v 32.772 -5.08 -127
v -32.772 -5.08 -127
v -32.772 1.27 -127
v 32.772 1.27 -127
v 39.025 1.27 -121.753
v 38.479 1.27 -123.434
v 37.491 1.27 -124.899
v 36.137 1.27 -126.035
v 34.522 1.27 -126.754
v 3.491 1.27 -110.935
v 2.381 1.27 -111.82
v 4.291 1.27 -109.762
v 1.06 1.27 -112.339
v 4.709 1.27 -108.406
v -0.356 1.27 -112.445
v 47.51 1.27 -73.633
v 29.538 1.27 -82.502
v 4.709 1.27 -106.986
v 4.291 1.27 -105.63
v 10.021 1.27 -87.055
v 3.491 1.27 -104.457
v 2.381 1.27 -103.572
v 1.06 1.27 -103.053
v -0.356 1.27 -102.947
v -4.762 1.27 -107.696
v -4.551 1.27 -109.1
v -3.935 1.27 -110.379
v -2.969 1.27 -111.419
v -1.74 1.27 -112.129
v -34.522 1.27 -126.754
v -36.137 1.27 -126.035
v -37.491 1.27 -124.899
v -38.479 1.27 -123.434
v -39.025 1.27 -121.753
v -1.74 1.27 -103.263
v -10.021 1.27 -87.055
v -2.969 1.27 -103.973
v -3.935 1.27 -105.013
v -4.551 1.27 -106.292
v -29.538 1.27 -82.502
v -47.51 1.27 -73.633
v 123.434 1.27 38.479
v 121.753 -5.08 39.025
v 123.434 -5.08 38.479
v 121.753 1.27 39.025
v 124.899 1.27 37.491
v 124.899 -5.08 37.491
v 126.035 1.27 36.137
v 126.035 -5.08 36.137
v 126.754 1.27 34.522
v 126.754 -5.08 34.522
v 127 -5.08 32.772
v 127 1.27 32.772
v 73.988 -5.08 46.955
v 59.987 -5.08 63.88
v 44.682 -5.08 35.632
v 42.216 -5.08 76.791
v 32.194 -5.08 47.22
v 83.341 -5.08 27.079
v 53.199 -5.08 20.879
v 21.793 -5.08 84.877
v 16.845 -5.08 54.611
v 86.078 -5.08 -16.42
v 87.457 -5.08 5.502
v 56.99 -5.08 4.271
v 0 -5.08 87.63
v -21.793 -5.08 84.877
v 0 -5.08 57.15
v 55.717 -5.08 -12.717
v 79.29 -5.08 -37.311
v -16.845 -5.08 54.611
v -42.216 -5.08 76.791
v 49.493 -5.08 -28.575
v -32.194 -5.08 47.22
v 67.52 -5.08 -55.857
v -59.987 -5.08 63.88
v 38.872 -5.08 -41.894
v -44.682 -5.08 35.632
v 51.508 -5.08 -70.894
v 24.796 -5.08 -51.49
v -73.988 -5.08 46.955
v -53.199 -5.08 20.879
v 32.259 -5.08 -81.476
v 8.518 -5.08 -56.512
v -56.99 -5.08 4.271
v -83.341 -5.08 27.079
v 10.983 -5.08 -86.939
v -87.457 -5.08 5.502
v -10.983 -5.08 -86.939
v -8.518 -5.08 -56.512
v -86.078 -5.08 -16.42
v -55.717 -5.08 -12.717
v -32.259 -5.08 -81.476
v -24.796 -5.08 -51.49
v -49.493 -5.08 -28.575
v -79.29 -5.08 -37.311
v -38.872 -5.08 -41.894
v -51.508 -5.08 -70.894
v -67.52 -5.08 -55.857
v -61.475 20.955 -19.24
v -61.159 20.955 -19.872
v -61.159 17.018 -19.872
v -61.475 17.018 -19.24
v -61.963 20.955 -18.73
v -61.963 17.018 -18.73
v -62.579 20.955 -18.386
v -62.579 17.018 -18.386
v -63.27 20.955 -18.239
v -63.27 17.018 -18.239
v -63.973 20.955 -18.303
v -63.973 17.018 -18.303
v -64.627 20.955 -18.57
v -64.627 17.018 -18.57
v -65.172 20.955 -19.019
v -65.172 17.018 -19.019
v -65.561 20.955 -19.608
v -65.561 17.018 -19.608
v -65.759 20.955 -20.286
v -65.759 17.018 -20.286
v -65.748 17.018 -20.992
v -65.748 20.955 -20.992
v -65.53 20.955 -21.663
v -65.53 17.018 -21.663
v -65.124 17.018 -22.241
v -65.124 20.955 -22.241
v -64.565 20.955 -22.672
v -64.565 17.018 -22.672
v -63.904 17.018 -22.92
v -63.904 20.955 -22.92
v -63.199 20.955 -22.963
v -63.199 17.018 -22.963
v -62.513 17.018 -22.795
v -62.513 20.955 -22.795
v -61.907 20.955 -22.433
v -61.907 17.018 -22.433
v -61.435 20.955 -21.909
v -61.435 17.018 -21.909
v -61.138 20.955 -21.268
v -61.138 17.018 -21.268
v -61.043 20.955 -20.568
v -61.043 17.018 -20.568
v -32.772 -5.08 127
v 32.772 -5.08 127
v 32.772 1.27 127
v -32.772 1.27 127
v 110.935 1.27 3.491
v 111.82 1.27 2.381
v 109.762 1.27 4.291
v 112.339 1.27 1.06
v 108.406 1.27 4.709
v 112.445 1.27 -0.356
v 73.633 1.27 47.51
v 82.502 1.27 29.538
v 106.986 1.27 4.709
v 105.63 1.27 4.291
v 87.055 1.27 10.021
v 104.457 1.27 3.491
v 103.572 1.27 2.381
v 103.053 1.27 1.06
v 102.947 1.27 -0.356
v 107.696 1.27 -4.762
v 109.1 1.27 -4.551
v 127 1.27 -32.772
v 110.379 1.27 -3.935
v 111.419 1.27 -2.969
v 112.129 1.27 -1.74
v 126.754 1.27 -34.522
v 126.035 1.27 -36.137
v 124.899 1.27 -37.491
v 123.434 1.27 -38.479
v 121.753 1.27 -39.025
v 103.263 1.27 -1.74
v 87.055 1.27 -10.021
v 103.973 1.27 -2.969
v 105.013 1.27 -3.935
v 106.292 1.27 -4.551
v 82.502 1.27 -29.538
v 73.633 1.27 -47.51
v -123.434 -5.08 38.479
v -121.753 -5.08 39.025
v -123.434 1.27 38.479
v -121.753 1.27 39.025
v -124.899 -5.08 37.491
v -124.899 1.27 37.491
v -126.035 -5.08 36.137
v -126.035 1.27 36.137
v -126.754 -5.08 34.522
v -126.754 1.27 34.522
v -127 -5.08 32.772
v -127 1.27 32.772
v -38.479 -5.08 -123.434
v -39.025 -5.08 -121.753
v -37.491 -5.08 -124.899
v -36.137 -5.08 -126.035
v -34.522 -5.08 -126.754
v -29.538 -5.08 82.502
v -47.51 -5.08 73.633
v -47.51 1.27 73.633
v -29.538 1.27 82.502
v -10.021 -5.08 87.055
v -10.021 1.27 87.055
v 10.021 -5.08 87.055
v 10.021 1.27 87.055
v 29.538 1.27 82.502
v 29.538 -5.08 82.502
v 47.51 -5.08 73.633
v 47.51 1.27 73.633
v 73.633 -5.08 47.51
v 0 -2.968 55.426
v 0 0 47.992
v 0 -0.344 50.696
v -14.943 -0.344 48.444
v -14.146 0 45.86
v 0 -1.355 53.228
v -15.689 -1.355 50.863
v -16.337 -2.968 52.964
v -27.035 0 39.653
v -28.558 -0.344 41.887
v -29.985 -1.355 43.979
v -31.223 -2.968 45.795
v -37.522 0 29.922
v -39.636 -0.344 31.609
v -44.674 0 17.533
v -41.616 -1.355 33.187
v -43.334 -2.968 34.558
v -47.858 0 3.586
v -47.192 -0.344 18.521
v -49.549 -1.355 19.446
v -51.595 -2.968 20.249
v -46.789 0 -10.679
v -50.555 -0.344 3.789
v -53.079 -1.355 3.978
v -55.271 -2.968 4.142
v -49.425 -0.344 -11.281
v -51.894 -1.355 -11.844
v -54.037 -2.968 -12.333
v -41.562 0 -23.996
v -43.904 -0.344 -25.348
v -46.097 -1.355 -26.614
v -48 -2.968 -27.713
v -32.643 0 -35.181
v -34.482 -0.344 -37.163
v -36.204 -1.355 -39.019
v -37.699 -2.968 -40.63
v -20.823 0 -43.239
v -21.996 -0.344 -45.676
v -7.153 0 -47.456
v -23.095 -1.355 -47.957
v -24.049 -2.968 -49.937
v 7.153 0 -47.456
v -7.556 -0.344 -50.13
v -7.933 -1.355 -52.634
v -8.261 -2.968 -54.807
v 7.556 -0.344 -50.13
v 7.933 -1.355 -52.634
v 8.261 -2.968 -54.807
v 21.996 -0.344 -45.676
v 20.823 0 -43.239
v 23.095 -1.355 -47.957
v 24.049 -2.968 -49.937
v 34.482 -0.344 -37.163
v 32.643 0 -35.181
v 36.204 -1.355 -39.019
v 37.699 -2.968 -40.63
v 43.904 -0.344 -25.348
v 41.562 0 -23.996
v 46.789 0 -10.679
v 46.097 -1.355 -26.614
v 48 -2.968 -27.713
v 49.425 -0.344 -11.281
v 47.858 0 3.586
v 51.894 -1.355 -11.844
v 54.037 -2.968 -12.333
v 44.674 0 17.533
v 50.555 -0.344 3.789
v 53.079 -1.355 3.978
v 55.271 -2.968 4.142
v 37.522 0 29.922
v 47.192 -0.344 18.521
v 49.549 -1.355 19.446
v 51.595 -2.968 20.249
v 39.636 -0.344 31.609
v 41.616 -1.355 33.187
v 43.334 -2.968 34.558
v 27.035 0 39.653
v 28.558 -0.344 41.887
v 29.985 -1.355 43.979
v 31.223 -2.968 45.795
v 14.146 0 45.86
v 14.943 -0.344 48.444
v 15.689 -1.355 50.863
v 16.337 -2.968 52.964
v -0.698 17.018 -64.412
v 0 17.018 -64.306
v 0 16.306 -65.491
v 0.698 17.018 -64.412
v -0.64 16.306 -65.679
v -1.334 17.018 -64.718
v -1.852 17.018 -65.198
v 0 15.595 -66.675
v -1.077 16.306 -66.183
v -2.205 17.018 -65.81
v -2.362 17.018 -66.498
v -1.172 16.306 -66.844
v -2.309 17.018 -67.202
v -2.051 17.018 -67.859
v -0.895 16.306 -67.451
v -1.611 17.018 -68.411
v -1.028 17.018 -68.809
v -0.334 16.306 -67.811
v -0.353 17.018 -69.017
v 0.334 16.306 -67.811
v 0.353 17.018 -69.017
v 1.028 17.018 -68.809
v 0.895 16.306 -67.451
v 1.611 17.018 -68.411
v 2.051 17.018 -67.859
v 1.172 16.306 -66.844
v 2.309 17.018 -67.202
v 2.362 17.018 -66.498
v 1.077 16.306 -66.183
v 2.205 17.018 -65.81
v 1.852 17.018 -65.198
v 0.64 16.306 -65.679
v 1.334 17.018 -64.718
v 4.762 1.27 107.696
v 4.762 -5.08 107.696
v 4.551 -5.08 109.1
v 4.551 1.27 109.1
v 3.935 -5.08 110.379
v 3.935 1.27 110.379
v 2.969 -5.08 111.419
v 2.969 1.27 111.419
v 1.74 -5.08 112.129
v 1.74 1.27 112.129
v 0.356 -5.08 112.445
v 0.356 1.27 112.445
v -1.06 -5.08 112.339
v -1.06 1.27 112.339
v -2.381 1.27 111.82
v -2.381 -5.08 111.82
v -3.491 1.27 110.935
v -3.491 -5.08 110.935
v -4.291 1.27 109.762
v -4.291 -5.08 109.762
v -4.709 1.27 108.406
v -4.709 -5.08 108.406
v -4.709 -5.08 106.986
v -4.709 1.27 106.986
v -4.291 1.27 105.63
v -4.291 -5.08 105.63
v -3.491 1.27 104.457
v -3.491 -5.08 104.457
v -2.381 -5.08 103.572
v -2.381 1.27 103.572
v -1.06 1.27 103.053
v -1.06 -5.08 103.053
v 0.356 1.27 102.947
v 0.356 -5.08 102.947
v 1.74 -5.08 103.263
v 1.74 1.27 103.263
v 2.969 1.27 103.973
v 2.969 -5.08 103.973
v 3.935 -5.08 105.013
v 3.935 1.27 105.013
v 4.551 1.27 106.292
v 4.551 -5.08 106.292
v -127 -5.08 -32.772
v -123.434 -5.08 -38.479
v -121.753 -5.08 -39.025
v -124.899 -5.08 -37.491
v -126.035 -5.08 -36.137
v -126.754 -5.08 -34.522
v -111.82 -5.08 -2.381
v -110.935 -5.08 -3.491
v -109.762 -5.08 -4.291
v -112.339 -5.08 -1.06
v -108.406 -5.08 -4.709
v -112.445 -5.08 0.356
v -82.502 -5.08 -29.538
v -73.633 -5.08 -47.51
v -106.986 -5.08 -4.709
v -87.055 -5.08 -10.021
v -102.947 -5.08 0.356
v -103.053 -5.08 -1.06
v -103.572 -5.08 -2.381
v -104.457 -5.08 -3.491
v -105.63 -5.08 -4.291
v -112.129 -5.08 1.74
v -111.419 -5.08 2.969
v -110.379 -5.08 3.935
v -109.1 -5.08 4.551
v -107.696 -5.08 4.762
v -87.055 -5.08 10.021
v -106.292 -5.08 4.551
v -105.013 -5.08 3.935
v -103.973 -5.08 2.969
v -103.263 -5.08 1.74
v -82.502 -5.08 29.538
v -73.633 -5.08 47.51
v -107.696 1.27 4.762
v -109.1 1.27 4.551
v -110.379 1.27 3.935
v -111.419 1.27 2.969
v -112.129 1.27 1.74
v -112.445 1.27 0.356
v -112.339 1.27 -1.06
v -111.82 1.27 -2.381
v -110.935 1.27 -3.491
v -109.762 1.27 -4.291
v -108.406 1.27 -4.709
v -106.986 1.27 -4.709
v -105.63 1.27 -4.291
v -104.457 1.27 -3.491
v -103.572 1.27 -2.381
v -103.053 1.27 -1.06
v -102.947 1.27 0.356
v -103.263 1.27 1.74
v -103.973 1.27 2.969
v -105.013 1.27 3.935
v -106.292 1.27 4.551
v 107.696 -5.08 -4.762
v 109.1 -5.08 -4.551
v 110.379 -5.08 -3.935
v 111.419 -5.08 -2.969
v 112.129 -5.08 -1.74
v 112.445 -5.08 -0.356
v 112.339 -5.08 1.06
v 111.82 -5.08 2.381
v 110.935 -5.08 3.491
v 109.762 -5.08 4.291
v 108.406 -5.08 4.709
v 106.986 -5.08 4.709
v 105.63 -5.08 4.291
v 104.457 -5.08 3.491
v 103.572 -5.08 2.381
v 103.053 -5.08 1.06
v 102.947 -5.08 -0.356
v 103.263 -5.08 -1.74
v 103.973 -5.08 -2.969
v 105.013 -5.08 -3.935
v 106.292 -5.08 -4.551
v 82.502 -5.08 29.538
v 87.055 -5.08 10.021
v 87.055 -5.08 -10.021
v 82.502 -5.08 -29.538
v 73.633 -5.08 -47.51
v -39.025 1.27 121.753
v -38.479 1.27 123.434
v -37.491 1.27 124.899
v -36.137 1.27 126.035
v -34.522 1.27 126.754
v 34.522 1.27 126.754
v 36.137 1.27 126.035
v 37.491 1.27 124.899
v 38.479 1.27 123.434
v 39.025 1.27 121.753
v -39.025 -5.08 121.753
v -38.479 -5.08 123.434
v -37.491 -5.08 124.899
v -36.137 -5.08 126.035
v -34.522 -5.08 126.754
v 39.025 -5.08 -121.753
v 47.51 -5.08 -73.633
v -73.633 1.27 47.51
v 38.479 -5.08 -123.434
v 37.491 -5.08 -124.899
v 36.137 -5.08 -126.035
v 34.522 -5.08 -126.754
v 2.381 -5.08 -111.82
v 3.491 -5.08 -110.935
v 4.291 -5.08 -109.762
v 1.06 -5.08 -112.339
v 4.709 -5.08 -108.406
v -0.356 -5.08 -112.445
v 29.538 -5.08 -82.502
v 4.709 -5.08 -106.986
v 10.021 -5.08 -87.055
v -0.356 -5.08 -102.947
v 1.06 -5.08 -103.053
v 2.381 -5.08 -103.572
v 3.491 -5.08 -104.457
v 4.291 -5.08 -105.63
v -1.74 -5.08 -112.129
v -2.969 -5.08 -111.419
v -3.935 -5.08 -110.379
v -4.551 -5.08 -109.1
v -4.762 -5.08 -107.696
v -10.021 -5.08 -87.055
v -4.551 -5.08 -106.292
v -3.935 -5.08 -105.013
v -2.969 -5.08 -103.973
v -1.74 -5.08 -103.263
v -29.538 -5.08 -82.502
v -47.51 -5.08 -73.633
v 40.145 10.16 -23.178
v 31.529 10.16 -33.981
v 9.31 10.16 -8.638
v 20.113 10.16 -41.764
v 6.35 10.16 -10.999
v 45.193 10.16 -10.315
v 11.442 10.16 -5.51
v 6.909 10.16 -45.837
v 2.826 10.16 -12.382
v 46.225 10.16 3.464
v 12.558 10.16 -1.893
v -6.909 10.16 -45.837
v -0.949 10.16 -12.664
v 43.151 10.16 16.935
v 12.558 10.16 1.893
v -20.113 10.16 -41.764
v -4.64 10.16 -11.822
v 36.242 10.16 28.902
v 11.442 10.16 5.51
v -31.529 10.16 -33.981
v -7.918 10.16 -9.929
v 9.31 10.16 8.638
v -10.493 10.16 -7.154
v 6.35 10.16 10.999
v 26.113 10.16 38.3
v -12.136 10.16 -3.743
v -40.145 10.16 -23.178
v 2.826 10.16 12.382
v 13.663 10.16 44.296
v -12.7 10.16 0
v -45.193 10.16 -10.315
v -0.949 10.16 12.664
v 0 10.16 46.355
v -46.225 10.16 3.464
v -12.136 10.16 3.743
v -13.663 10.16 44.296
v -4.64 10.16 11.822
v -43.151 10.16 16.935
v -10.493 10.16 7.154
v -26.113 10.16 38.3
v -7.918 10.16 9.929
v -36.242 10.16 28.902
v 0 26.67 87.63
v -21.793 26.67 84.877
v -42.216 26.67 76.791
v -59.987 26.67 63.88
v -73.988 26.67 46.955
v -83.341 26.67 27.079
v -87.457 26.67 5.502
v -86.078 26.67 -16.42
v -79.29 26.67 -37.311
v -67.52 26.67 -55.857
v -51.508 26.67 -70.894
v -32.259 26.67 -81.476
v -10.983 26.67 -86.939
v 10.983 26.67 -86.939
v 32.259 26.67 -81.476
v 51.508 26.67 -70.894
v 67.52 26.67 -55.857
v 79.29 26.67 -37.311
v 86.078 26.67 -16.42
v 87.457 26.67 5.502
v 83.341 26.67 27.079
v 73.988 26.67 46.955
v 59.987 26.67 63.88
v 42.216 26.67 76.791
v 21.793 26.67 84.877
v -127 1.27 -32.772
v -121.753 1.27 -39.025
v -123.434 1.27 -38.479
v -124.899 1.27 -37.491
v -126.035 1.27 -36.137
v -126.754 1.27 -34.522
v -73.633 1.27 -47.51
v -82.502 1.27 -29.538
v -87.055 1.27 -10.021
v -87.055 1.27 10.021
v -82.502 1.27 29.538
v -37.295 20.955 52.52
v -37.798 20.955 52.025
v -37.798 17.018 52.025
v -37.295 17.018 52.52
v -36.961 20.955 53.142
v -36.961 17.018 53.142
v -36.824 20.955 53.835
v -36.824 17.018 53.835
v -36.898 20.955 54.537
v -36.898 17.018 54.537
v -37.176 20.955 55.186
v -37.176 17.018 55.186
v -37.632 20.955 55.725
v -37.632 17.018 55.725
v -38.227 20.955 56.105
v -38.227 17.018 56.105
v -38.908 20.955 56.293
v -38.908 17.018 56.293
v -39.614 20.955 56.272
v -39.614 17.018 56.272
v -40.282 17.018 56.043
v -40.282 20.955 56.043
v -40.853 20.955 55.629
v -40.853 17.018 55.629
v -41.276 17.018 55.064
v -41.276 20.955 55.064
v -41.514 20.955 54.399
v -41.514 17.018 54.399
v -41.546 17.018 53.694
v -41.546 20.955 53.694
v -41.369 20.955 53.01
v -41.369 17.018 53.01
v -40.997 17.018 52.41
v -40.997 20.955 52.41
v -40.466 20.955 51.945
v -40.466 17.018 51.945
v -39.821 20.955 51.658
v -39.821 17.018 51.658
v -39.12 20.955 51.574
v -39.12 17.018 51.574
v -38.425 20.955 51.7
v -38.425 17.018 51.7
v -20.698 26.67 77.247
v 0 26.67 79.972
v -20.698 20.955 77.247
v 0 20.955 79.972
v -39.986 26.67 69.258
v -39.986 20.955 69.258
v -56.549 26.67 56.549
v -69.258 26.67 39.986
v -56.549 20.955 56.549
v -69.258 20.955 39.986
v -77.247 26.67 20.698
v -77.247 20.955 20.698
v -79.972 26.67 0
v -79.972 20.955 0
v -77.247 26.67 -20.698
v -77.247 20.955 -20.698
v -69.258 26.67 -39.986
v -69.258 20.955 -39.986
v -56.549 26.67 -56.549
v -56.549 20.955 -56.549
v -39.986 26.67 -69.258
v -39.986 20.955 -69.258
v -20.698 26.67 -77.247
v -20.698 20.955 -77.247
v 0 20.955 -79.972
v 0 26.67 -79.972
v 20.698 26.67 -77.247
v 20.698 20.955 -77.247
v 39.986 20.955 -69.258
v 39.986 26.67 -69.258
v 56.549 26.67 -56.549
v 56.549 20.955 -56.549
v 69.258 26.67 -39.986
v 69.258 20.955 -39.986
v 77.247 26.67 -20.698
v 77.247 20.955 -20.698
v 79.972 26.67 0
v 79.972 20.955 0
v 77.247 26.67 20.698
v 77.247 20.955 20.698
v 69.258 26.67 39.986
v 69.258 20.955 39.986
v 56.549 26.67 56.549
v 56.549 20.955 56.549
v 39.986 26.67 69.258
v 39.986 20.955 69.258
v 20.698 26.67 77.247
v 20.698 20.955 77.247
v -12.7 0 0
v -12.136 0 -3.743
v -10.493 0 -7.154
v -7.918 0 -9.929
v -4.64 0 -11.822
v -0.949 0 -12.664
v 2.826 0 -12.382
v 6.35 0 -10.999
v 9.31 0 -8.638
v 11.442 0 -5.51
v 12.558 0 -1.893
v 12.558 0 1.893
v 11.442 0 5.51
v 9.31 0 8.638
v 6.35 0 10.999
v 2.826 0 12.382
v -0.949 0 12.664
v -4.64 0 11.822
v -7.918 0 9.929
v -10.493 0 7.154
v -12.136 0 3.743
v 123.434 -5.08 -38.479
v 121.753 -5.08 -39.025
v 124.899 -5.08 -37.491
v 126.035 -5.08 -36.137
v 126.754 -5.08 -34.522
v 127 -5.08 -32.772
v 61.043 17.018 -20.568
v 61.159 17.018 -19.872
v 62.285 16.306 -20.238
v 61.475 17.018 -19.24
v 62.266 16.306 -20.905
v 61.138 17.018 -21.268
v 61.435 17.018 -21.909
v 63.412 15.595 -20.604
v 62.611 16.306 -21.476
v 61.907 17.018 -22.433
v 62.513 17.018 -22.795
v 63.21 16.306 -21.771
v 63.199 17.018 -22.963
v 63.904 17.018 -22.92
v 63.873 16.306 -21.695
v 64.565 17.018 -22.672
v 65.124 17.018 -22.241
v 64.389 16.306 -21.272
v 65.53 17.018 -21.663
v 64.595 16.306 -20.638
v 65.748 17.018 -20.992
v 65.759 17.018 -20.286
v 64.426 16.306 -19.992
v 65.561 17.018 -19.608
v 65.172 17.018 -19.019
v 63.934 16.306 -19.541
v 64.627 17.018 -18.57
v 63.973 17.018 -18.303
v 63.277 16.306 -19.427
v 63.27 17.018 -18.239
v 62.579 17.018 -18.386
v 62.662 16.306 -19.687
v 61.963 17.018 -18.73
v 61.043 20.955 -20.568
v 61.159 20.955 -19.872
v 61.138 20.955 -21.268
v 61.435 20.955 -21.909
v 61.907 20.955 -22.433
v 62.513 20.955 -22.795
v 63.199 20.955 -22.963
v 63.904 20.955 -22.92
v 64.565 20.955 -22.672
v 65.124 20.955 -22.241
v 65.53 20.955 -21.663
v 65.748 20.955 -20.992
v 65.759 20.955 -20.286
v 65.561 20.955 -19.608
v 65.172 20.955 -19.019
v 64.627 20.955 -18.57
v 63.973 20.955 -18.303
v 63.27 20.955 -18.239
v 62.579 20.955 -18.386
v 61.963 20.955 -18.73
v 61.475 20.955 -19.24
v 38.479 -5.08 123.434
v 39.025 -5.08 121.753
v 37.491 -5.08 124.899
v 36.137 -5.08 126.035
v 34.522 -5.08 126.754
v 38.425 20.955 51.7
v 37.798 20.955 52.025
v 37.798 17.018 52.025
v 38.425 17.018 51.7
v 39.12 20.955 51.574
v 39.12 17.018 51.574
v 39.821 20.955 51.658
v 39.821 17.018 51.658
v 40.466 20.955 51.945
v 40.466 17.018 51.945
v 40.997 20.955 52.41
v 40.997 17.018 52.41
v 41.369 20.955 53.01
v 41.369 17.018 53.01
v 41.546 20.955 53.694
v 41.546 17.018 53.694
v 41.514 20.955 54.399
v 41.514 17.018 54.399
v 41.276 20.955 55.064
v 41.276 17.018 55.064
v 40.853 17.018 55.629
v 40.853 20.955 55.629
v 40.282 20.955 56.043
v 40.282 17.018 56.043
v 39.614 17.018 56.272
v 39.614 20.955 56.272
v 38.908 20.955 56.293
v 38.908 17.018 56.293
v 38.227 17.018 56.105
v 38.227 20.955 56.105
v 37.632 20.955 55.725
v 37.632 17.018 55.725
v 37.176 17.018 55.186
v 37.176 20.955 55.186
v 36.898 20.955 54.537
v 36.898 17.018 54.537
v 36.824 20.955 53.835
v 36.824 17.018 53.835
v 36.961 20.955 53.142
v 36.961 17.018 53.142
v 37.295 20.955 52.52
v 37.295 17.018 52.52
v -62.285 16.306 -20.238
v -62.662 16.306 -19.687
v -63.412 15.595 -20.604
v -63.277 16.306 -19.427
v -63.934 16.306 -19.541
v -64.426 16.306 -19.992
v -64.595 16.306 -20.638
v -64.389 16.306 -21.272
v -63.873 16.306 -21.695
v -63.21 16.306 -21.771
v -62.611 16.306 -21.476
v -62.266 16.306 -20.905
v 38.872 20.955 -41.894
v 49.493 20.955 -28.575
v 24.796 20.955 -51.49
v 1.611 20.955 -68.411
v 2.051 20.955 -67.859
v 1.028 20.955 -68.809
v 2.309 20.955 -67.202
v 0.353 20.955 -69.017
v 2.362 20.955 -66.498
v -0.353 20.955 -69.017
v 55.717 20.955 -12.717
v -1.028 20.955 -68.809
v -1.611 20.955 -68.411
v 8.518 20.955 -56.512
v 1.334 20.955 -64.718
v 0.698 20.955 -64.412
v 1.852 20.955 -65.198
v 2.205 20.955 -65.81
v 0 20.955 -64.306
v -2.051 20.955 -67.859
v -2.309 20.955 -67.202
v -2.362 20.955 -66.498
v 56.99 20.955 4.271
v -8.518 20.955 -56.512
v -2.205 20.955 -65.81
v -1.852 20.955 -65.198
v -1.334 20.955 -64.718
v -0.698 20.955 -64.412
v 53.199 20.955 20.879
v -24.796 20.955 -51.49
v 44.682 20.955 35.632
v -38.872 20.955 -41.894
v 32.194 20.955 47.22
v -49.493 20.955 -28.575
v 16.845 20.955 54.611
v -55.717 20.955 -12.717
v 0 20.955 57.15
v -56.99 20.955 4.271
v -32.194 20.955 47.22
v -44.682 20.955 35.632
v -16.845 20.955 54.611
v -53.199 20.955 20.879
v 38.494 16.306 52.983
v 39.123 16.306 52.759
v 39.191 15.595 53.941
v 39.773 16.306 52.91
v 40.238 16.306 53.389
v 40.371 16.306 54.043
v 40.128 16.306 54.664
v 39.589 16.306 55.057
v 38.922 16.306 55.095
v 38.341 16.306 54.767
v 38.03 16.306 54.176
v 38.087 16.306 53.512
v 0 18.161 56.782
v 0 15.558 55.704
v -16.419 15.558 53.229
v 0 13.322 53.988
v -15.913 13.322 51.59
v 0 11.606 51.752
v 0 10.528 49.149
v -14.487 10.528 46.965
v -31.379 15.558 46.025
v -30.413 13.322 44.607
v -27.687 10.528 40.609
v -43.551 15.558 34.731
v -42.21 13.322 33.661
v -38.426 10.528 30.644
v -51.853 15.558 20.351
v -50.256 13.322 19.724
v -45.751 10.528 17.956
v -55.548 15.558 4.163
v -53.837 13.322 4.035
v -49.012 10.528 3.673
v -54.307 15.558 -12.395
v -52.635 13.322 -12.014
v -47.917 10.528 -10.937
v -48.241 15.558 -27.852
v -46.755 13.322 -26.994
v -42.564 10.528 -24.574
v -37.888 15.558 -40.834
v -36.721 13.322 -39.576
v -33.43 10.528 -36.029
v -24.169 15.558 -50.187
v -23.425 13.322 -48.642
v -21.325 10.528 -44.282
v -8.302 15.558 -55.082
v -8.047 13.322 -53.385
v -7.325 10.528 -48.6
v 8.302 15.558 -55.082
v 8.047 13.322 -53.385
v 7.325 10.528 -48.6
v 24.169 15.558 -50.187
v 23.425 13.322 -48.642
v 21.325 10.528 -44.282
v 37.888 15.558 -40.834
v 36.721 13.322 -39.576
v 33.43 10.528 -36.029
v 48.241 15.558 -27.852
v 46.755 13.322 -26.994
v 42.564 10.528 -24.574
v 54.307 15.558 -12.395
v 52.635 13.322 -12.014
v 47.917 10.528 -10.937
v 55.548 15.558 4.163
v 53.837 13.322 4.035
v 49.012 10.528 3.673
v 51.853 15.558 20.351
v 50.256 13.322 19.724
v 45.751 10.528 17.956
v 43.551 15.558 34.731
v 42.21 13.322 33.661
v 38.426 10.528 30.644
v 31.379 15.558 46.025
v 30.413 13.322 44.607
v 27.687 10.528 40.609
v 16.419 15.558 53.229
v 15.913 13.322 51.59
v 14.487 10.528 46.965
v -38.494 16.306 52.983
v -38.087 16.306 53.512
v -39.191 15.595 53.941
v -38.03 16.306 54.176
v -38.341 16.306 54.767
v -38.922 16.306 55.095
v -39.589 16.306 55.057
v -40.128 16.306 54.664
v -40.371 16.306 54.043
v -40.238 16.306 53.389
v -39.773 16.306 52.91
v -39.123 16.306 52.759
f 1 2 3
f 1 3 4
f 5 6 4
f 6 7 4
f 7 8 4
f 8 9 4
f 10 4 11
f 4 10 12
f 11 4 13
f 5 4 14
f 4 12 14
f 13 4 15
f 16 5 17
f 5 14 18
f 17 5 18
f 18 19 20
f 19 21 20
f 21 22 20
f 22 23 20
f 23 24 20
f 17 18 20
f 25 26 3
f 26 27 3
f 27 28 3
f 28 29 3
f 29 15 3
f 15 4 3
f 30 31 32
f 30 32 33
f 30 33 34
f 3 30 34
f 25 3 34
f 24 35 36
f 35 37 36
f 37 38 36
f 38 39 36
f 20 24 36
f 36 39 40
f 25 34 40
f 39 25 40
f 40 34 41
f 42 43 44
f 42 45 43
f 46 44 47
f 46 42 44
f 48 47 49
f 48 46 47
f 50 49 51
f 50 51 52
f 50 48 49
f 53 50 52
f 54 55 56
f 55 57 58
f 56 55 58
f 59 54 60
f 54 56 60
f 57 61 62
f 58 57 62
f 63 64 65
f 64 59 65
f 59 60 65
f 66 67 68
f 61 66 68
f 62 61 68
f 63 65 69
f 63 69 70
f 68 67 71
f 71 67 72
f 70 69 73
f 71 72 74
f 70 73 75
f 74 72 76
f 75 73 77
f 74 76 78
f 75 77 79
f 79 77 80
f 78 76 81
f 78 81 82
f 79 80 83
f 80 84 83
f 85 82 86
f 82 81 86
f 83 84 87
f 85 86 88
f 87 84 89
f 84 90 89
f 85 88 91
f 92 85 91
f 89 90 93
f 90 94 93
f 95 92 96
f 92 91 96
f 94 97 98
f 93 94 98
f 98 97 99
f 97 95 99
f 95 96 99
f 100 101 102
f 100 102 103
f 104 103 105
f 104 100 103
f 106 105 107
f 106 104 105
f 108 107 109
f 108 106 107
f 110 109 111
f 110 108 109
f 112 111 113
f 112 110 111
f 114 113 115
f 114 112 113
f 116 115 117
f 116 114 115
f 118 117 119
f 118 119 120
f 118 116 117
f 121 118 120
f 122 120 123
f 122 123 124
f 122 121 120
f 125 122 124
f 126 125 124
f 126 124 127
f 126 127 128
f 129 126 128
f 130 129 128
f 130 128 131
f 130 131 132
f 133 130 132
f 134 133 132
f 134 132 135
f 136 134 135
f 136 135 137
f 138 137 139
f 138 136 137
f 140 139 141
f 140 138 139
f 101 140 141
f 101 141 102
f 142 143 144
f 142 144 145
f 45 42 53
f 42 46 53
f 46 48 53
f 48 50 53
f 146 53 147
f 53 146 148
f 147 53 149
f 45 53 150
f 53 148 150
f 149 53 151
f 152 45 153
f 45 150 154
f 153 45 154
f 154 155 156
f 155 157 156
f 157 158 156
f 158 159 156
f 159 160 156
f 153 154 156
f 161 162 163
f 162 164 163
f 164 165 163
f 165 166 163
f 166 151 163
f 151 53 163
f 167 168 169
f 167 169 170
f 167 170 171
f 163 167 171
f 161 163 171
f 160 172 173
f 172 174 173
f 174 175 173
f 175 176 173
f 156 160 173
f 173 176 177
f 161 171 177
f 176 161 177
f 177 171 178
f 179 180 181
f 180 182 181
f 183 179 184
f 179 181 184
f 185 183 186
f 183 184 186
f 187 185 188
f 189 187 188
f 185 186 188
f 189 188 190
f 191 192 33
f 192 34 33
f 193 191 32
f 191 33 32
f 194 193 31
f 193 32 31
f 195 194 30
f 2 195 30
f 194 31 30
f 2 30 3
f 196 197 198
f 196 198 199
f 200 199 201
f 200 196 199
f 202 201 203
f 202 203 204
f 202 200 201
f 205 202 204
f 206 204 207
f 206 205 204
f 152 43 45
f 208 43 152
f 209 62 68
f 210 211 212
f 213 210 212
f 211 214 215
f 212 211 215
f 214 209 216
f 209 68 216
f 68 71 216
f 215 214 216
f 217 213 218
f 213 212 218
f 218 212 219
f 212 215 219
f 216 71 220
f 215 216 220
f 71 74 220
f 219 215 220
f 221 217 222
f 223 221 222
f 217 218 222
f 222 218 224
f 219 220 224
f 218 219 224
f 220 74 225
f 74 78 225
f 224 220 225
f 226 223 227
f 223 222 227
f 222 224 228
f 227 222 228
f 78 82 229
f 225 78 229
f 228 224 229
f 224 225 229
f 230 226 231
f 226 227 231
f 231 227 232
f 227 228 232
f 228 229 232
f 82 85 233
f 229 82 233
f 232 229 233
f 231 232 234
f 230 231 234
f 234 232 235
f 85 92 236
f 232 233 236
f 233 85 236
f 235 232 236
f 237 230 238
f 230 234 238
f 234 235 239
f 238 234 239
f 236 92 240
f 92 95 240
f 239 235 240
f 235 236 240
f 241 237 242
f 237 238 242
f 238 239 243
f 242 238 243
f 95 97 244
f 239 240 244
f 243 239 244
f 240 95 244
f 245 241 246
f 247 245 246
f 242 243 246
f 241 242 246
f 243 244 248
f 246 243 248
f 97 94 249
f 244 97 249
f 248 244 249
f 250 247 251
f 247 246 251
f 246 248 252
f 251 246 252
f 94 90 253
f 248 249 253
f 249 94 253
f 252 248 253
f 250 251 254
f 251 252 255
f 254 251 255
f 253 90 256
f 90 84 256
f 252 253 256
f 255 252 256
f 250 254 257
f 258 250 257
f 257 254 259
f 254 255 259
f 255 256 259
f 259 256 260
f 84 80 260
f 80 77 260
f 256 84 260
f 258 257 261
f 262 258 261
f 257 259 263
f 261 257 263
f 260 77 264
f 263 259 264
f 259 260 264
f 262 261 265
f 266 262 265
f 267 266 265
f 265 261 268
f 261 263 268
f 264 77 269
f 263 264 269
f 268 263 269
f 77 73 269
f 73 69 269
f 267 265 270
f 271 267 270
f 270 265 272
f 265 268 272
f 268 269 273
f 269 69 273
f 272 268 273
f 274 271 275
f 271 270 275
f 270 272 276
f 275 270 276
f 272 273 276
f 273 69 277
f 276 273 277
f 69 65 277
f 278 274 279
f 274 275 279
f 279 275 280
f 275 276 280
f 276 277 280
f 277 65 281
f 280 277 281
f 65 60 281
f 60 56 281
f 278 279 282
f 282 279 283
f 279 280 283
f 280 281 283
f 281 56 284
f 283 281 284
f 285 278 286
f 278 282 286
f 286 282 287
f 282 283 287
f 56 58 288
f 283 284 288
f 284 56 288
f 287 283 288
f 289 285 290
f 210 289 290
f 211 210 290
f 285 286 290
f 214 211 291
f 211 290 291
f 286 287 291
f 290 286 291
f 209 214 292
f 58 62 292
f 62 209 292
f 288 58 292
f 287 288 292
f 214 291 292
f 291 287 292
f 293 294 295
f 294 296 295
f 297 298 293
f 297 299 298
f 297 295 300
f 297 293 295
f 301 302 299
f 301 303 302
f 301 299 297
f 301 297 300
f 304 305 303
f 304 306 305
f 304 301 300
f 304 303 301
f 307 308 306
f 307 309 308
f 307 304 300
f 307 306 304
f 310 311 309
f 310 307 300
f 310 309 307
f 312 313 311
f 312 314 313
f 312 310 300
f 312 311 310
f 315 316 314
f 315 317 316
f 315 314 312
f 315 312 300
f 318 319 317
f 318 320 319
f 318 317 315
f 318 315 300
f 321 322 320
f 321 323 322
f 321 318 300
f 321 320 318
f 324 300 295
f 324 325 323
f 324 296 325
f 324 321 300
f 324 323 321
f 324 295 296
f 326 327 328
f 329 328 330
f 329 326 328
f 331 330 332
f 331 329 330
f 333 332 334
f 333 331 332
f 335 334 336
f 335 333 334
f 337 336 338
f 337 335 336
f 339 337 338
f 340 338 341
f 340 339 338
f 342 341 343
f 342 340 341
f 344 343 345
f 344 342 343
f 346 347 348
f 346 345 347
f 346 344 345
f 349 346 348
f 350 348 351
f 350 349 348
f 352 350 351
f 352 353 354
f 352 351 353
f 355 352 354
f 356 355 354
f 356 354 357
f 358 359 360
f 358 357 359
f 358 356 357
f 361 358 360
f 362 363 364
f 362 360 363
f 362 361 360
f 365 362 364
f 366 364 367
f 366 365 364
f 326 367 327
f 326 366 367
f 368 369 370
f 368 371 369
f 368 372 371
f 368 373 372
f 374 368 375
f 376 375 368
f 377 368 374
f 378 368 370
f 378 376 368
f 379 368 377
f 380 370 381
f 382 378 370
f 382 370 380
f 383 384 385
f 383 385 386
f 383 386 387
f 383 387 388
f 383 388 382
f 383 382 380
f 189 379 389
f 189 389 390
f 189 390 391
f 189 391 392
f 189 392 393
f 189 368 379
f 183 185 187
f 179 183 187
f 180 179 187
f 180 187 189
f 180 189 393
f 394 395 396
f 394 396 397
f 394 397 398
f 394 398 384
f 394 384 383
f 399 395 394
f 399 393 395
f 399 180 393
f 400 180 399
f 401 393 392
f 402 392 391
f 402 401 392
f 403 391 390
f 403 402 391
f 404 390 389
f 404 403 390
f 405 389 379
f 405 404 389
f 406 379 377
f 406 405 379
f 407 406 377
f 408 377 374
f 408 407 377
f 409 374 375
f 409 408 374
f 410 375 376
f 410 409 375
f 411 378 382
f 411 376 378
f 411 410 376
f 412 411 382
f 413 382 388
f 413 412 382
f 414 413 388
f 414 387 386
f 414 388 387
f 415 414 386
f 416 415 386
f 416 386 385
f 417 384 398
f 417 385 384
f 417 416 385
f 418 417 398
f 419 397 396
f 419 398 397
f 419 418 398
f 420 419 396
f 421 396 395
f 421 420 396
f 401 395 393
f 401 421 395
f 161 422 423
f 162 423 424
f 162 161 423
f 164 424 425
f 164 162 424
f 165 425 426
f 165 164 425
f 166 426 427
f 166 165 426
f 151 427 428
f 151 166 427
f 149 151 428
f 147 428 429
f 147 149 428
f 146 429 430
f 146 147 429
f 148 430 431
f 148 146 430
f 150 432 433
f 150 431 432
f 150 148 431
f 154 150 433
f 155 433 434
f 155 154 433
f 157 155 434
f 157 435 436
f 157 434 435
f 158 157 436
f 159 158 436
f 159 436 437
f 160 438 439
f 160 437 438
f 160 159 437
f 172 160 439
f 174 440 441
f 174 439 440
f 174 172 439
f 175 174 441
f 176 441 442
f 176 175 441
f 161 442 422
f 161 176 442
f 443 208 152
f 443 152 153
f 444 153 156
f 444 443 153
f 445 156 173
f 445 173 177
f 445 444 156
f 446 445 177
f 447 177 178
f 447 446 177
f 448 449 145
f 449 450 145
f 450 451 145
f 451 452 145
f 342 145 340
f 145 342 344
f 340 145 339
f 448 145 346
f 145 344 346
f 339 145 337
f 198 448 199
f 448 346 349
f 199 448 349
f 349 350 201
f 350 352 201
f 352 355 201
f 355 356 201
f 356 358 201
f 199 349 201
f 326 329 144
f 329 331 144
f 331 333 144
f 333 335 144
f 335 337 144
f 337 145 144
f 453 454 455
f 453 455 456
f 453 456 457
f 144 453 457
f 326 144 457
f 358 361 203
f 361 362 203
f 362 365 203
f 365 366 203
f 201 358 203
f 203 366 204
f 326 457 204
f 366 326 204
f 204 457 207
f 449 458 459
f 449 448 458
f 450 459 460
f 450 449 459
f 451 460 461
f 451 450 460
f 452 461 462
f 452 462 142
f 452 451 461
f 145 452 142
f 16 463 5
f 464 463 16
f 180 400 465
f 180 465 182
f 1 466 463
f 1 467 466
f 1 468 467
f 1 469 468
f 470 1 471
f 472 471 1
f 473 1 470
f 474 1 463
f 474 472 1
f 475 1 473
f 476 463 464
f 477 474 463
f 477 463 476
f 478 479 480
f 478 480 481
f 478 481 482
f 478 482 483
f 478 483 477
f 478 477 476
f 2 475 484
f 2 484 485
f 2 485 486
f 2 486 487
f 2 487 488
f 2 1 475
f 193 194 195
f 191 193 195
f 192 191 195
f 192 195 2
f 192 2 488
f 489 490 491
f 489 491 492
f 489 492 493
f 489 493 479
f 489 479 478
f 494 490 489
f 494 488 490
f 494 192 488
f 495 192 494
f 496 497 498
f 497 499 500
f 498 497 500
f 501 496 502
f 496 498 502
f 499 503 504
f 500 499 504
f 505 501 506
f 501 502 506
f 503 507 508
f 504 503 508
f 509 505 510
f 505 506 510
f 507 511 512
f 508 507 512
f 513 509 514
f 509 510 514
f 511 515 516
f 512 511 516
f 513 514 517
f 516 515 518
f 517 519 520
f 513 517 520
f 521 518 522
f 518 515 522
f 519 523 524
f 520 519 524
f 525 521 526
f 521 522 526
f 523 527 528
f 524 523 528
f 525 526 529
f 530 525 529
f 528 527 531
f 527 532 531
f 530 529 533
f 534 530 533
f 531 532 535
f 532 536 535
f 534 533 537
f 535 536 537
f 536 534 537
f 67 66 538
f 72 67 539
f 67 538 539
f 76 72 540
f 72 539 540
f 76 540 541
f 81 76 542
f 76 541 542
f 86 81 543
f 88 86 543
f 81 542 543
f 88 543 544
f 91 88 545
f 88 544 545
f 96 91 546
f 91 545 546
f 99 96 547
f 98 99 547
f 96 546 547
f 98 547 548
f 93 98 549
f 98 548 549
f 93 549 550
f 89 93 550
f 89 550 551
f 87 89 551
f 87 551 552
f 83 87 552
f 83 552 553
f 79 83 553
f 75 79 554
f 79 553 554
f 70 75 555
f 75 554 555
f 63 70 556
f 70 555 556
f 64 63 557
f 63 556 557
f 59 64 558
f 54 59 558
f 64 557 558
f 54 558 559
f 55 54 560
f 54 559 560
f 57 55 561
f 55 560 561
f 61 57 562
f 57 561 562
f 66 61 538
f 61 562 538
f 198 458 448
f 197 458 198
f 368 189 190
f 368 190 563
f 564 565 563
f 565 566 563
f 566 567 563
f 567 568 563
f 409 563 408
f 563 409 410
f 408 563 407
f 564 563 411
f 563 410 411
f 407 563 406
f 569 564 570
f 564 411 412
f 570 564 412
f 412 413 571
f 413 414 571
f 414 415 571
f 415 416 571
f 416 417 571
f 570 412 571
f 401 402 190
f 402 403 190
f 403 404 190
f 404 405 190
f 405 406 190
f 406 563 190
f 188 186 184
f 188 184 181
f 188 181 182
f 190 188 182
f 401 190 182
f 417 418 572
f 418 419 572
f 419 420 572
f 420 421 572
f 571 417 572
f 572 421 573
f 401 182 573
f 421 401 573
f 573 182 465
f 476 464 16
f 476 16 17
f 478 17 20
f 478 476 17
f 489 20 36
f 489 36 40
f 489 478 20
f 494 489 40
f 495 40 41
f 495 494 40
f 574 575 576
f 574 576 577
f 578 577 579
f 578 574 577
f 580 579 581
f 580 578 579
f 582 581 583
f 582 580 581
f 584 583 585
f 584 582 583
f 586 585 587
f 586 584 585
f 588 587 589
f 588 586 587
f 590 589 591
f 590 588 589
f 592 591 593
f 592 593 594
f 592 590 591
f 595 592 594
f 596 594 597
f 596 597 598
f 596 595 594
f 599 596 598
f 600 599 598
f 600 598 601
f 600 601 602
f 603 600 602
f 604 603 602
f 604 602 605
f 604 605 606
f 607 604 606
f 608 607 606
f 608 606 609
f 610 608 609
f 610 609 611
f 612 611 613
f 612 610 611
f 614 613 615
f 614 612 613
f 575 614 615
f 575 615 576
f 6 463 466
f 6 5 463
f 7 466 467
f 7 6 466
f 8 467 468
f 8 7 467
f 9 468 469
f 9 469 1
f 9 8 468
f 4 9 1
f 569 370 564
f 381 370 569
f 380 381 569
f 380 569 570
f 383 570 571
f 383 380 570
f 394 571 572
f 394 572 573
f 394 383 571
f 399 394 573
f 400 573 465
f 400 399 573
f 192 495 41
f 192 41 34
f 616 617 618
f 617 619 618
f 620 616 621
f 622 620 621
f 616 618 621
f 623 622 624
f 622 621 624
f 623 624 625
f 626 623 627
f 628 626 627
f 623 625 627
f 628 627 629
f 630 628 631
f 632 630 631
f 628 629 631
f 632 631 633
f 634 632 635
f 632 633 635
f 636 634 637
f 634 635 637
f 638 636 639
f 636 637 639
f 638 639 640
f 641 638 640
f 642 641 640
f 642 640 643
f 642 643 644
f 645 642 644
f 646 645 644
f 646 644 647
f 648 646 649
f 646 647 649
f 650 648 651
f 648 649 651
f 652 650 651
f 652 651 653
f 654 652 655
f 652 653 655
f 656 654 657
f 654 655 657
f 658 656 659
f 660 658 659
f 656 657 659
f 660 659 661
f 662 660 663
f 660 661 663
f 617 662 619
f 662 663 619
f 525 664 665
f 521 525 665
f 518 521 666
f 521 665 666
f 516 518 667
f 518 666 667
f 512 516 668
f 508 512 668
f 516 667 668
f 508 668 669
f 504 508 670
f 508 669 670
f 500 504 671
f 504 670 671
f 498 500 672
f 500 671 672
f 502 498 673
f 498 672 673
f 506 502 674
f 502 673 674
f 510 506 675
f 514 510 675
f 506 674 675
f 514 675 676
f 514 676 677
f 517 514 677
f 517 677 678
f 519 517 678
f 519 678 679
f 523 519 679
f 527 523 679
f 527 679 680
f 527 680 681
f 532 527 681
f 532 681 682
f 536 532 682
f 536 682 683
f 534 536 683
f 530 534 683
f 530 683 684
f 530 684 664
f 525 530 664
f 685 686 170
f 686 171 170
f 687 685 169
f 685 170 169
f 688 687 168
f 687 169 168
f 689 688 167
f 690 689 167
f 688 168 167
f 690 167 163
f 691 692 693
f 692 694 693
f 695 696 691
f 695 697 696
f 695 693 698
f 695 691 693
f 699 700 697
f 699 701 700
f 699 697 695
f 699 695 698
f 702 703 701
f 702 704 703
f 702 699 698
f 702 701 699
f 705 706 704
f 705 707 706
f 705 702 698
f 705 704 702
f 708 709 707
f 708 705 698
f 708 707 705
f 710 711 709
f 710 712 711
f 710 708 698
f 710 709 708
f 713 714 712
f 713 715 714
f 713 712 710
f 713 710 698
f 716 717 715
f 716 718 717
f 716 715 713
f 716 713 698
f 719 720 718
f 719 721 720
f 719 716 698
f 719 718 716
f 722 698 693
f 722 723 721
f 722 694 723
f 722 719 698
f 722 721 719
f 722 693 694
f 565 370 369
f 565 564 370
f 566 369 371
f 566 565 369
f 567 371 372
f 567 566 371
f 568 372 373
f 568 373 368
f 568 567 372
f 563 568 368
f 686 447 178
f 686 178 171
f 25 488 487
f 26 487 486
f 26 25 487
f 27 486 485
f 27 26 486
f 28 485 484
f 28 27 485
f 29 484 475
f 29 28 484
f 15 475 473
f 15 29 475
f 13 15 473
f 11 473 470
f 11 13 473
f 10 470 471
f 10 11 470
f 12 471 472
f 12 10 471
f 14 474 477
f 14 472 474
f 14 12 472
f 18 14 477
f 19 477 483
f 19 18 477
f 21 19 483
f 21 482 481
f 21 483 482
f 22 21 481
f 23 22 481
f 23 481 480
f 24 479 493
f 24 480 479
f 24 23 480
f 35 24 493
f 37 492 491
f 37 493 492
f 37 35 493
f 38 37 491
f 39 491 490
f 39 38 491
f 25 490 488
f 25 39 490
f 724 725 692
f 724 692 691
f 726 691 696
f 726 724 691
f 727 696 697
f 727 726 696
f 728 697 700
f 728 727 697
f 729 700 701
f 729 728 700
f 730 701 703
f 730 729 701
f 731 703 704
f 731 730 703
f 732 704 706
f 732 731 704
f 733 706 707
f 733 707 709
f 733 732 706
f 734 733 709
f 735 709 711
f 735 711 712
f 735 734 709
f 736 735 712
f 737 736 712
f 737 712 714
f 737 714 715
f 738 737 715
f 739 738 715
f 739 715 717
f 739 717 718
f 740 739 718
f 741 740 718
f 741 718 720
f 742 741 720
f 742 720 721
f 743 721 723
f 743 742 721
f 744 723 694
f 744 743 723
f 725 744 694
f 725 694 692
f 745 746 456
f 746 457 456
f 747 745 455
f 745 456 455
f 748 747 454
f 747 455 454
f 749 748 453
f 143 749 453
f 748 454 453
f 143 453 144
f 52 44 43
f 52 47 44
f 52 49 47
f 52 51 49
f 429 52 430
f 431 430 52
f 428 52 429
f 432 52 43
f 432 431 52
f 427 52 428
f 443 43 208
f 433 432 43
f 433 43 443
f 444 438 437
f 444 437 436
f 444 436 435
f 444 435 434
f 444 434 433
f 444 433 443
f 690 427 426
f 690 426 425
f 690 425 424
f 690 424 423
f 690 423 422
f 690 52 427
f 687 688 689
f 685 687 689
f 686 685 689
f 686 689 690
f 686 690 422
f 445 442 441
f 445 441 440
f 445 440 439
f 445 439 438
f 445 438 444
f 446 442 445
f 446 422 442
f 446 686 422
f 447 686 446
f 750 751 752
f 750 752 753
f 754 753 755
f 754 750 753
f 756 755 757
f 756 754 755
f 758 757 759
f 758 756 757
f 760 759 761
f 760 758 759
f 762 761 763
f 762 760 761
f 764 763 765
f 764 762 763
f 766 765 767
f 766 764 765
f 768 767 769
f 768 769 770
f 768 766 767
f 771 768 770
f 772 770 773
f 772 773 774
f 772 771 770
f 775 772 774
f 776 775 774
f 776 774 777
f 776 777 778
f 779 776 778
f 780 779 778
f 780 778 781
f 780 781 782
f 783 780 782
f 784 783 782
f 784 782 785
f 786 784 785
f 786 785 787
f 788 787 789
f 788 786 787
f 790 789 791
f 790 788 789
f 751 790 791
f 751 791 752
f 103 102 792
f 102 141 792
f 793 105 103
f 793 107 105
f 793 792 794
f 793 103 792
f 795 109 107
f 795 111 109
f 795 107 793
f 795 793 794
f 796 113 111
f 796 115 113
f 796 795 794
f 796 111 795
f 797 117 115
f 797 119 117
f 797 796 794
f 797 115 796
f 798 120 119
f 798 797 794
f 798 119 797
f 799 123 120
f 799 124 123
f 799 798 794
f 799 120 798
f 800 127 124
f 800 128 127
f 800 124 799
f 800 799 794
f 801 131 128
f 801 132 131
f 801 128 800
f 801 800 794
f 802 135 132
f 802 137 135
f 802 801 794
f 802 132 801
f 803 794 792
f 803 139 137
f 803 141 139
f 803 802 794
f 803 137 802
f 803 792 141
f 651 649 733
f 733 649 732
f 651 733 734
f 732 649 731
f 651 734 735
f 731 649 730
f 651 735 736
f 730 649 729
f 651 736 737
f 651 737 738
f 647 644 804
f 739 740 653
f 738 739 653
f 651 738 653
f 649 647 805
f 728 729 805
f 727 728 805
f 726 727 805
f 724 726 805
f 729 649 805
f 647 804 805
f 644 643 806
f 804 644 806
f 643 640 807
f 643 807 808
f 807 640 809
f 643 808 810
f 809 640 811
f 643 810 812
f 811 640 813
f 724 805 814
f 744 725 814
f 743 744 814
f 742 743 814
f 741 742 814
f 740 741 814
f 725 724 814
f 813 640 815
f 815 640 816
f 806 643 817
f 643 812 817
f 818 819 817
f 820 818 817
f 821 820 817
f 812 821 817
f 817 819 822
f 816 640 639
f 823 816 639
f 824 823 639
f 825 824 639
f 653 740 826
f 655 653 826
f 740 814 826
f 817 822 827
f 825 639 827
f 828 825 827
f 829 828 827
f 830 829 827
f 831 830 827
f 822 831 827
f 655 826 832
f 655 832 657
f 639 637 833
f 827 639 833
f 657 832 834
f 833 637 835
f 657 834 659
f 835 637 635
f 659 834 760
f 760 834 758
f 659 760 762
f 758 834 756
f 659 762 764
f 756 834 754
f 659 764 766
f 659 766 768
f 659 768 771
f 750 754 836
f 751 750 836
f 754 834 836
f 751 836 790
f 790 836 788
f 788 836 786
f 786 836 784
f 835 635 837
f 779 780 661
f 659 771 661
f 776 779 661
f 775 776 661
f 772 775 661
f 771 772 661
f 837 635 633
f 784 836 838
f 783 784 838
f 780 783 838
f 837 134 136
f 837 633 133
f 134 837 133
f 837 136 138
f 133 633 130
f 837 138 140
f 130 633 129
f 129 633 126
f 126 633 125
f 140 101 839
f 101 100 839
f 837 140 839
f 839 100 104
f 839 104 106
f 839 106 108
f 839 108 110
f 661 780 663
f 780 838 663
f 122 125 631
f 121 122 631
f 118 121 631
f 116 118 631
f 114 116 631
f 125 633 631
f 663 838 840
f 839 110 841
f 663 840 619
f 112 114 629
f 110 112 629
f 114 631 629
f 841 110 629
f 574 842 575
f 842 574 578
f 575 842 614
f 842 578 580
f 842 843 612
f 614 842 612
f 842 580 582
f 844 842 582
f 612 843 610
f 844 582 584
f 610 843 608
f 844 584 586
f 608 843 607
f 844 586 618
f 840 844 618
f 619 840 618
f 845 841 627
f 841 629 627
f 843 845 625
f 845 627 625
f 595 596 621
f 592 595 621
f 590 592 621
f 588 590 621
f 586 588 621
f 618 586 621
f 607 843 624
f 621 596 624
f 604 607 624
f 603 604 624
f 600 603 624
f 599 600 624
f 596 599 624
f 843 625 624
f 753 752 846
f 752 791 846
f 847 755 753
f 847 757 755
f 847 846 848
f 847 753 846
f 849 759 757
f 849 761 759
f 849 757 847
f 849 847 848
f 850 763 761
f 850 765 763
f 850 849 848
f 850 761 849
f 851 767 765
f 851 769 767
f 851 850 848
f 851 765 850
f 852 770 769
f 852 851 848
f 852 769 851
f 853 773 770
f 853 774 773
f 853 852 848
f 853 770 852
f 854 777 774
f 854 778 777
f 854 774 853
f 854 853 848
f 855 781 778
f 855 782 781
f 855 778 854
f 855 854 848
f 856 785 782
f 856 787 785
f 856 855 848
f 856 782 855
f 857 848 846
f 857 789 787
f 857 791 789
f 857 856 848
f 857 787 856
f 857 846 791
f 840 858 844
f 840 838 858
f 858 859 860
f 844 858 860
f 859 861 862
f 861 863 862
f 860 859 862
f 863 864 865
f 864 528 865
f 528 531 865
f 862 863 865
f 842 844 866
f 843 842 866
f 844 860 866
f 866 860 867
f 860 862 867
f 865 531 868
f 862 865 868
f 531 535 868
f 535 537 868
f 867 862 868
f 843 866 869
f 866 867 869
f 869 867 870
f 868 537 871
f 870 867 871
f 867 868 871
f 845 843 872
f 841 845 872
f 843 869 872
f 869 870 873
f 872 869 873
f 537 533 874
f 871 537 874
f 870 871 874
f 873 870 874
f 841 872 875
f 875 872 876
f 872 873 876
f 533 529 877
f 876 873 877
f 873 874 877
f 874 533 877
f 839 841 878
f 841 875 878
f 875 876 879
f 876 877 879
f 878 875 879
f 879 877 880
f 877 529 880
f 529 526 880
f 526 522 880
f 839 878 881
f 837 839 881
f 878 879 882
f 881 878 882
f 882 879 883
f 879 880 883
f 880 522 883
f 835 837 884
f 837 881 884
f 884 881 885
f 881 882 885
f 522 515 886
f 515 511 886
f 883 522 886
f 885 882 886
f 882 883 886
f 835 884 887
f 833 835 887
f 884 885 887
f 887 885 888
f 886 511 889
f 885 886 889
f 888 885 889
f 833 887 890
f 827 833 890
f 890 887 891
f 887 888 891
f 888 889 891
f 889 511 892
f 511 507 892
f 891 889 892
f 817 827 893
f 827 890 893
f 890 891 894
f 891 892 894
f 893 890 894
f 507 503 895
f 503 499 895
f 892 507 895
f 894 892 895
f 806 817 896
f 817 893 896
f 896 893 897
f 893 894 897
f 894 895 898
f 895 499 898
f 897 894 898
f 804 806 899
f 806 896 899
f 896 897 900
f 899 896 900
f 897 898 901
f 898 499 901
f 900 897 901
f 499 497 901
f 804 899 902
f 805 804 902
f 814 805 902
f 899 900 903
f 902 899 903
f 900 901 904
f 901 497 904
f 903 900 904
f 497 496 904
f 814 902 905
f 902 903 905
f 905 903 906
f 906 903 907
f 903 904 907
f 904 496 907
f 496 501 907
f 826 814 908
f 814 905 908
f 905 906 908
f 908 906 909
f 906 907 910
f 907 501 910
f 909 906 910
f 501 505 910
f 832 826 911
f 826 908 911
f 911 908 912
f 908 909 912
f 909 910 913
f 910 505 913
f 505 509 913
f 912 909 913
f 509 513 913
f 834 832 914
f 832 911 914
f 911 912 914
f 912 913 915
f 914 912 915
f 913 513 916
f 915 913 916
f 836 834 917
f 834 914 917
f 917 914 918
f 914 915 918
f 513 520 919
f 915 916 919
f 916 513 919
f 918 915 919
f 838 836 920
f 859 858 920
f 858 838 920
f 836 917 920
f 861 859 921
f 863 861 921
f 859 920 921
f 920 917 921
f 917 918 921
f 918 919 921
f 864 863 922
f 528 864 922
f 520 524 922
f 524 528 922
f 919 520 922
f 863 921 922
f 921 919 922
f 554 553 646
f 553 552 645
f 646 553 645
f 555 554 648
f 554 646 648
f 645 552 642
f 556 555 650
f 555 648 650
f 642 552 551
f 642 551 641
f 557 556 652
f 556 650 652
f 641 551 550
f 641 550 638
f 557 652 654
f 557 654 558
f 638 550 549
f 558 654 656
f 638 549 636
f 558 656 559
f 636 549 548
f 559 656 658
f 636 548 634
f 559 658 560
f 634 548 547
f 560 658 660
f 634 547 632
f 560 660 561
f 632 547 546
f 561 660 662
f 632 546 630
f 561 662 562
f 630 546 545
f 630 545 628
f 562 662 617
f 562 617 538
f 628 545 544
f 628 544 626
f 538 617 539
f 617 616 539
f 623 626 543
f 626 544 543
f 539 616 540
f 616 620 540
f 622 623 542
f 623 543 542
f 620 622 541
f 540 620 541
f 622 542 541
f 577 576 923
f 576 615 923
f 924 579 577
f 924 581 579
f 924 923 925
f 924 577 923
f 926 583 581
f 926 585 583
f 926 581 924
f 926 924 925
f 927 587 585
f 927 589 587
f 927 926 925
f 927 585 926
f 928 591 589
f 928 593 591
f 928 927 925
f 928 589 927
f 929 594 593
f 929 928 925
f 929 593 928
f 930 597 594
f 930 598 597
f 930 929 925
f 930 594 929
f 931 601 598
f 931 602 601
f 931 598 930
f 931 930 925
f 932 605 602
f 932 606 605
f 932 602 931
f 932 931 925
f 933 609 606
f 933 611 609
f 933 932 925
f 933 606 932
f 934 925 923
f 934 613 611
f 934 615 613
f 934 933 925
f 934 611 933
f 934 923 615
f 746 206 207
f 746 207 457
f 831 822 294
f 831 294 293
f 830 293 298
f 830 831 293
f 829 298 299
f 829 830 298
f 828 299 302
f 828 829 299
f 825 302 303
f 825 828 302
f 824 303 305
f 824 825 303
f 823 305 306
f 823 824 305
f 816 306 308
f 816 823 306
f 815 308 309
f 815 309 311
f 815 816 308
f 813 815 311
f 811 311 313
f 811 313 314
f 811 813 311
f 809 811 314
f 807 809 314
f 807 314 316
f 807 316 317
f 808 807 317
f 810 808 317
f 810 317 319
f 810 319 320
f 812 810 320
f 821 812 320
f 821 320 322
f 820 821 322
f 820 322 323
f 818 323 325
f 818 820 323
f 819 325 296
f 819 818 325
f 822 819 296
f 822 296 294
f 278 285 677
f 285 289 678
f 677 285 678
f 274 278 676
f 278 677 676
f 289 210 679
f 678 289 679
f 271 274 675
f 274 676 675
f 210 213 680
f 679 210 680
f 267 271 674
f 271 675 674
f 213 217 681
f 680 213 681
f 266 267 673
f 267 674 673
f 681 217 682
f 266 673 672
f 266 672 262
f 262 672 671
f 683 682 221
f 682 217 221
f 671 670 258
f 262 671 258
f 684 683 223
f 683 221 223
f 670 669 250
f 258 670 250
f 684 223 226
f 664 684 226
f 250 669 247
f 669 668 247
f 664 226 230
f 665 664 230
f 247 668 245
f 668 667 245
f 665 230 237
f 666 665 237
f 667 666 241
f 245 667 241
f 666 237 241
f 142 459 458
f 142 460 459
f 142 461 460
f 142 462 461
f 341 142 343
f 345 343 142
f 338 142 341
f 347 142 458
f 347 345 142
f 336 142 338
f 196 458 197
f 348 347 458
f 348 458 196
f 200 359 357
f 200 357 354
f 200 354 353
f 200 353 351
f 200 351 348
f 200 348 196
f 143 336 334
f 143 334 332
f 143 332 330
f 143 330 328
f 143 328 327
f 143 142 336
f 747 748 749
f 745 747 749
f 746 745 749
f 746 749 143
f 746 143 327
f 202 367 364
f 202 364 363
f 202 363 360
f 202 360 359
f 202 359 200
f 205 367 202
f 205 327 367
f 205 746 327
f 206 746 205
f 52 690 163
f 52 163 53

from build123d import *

# Parameters (mm, degrees)
F_3_16_0_1865_DIAMETER_HOLE1_AT_2_COUNT = 2
F_3_16_0_1865_DIAMETER_HOLE1_AT_2_PITCH = 181.676687383
CIRPATTERN2_COUNT                       = 5
F_1_1_DIAMETER_HOLE1_D                  = 25.4
BOSS_EXTRUDE1_DEPTH                     = 6.35
FILLET2_R                               = 6.35
CIRPATTERN4_COUNT                       = 4
FILLET3_R                               = 10.795


with BuildPart() as part:
    # Sketch1 → Revolve1 (revolve)
    with BuildSketch(Plane.XY, mode=Mode.PRIVATE) as revolve1_sk:
        Polygon((87.63, -5.08), (87.63, 26.67), (79.9719, 26.67), (79.9719, 20.955), (57.15, 20.955), (57.15, 10.16), (0, 10.16), (0, 0), (57.15, 0), (57.15, -5.08), align=None)
    revolve(revolve1_sk.sketch.rotate(Axis((0, 92.596818824, 0), (0, -1, 0)), 90), axis=Axis((0, 92.596818824, 0), (0, -1, 0)))

    # Sketch6 → 3/16 (0.1865) Diameter Hole1 (revolve, cut)
    with BuildSketch(Plane(origin=(0, 26.67, -66.675), x_dir=(0, 0, 1), z_dir=(1, 0, 0))):
        Polygon((0, 0), (0, 11.075168419), (2.36855, 9.652), (2.36855, 0), align=None)
    f_3_16_0_1865_diameter_hole1 = revolve(axis=Axis((0, 33.02, -66.675), (0, -1, 0)), mode=Mode.SUBTRACT)

    # 3/16 (0.1865) Diameter Hole1 at 2: 3/16 (0.1865) Diameter Hole1 ×2
    with Locations(*[Vector(-0.6277965872660483, 0, 0.778377443800309) * (i * F_3_16_0_1865_DIAMETER_HOLE1_AT_2_PITCH) for i in range(1, F_3_16_0_1865_DIAMETER_HOLE1_AT_2_COUNT)]):
        add(f_3_16_0_1865_diameter_hole1, mode=Mode.SUBTRACT)

    # CirPattern2: 3/16 (0.1865) Diameter Hole1 ×5 about axis
    cirpattern2_axis = Axis((0, 0, 0), (0, 1, 0))
    for i in range(1, CIRPATTERN2_COUNT):
        add(f_3_16_0_1865_diameter_hole1.rotate(cirpattern2_axis, i * 360 / CIRPATTERN2_COUNT), mode=Mode.SUBTRACT)

    # CirPattern2 copy 1 sketch → CirPattern2 copy 1 (revolve, cut)
    with BuildSketch(Plane(origin=(35.834852053, 26.67, 131.569029239), x_dir=(0.9510565162951535, 0, 0.30901699437494745), z_dir=(0.30901699437494745, 0, -0.9510565162951535))):
        Polygon((0, 0), (0, 11.075168419), (2.36855, 9.652), (2.36855, 0), align=None)
    revolve(axis=Axis((35.834852053, 33.02, 131.569029239), (0, -1, 0)), mode=Mode.SUBTRACT)

    # CirPattern2 copy 2 sketch → CirPattern2 copy 2 (revolve, cut)
    with BuildSketch(Plane(origin=(136.203160876, 26.67, 6.576096413), x_dir=(0.5877852522924732, 0, -0.8090169943749473), z_dir=(-0.8090169943749473, 0, -0.5877852522924732))):
        Polygon((0, 0), (0, 11.075168419), (2.36855, 9.652), (2.36855, 0), align=None)
    revolve(axis=Axis((136.203160876, 33.02, 6.576096413), (0, -1, 0)), mode=Mode.SUBTRACT)

    # CirPattern2 copy 3 sketch → CirPattern2 copy 3 (revolve, cut)
    with BuildSketch(Plane(origin=(48.343330743, 26.67, -127.504778142), x_dir=(-0.587785252292473, 0, -0.8090169943749476), z_dir=(-0.8090169943749476, 0, 0.587785252292473))):
        Polygon((0, 0), (0, 11.075168419), (2.36855, 9.652), (2.36855, 0), align=None)
    revolve(axis=Axis((48.343330743, 33.02, -127.504778142), (0, -1, 0)), mode=Mode.SUBTRACT)

    # CirPattern2 copy 4 sketch → CirPattern2 copy 4 (revolve, cut)
    with BuildSketch(Plane(origin=(-106.325339347, 26.67, -85.378383033), x_dir=(-0.9510565162951536, 0, 0.30901699437494723), z_dir=(0.30901699437494723, 0, 0.9510565162951536))):
        Polygon((0, 0), (0, 11.075168419), (2.36855, 9.652), (2.36855, 0), align=None)
    revolve(axis=Axis((-106.325339347, 33.02, -85.378383033), (0, -1, 0)), mode=Mode.SUBTRACT)

    # 1 (1) Diameter Hole1 (through all)
    with Locations(Plane(origin=(0, 10.16, 0), x_dir=(1, 0, 0), z_dir=(0, 1, 0))):
        with Locations((0, 0)):
            Hole(F_1_1_DIAMETER_HOLE1_D / 2)

    # Fillet3
    # the kernel refuses this fillet: 10.795 mm, written as the material it adds along each edge
    with BuildSketch(Plane(origin=(0, 10.16, 0), x_dir=(0, 0, 1), z_dir=(1, 0, 0))) as fillet3_piece_1:
        with BuildLine():
            CenterArc((57.15 - FILLET3_R, -FILLET3_R), FILLET3_R, 0, 90)
            Line((57.15 - FILLET3_R, 0), (57.15 - FILLET3_R, FILLET3_R * 0.02))
            Line((57.15 - FILLET3_R, FILLET3_R * 0.02), (57.15 + FILLET3_R * 0.02, FILLET3_R * 0.02))
            Line((57.15 + FILLET3_R * 0.02, FILLET3_R * 0.02), (57.15 + FILLET3_R * 0.02, -FILLET3_R))
            Line((57.15 + FILLET3_R * 0.02, -FILLET3_R), (57.15, -FILLET3_R))
        make_face()
    revolve(axis=Axis((0, 10.16, 0), (0, -1, 0)))
    with BuildSketch(Plane(origin=(0, 0, 0), x_dir=(0, 0, 1), z_dir=(1, 0, 0))) as fillet3_piece_2:
        with BuildLine():
            CenterArc((47.99189976, 10.795), FILLET3_R, 270, 58.034281249)
            Line((47.99189976, 0), (47.99189976, -0.2159))
            Line((47.99189976, -0.2159), (57.15, -0.2159))
            Line((57.15, -0.2159), (57.3659, 0))
            ThreePointArc((57.3659, 0), (57.3659, 2.54), (57.333162005, 4.9657))
            Line((57.333162005, 4.9657), (57.15, 5.08))
        make_face()
    revolve(axis=Axis((0, 0, 0), (0, -1, 0)))


with BuildPart() as body_2:
    # Sketch15 → Boss-Extrude1 (new body)
    with BuildSketch(Plane.XZ.offset(5.08)):
        with BuildLine():
            Line((-127, -38.1), (-73.632954963, -47.510049921))
            ThreePointArc((-73.632954963, -47.510049921), (-87.63, 0), (-73.632954963, 47.510049921))
            Line((-73.632954963, 47.510049921), (-127, 38.1))
            Line((-127, 38.1), (-127, -38.1))
        make_face()
    extrude(amount=-BOSS_EXTRUDE1_DEPTH)

    # Fillet2
    fillet2_edges = [body_2.edges().sort_by_distance(p)[0] for p in [
        (-127, -1.905, 38.1),
        (-127, -1.905, -38.1),
    ]]
    fillet(fillet2_edges, radius=FILLET2_R)

    # Sketch17 → 3/8 (0.375) Diameter Hole1 (revolve, cut)
    with BuildSketch(Plane(origin=(-107.696, 1.27, 0), x_dir=(0, 0, 1), z_dir=(1, 0, 0))):
        Polygon((0, 0), (0, 28.261598698), (4.7625, 25.4), (4.7625, 0), align=None)
    revolve(axis=Axis((-107.696, 7.62, 0), (0, -1, 0)), mode=Mode.SUBTRACT)


with BuildPart() as cirpattern4_1:
    # CirPattern4: pattern copy
    add(body_2.part.rotate(Axis((0, 0, 0), (0, 1, 0)), 1 * 360 / CIRPATTERN4_COUNT))


with BuildPart() as cirpattern4_2:
    # CirPattern4: pattern copy
    add(body_2.part.rotate(Axis((0, 0, 0), (0, 1, 0)), 2 * 360 / CIRPATTERN4_COUNT))


with BuildPart() as cirpattern4_3:
    # CirPattern4: pattern copy
    add(body_2.part.rotate(Axis((0, 0, 0), (0, 1, 0)), 3 * 360 / CIRPATTERN4_COUNT))


solid = Compound([part.part, body_2.part, cirpattern4_1.part, cirpattern4_2.part, cirpattern4_3.part])
